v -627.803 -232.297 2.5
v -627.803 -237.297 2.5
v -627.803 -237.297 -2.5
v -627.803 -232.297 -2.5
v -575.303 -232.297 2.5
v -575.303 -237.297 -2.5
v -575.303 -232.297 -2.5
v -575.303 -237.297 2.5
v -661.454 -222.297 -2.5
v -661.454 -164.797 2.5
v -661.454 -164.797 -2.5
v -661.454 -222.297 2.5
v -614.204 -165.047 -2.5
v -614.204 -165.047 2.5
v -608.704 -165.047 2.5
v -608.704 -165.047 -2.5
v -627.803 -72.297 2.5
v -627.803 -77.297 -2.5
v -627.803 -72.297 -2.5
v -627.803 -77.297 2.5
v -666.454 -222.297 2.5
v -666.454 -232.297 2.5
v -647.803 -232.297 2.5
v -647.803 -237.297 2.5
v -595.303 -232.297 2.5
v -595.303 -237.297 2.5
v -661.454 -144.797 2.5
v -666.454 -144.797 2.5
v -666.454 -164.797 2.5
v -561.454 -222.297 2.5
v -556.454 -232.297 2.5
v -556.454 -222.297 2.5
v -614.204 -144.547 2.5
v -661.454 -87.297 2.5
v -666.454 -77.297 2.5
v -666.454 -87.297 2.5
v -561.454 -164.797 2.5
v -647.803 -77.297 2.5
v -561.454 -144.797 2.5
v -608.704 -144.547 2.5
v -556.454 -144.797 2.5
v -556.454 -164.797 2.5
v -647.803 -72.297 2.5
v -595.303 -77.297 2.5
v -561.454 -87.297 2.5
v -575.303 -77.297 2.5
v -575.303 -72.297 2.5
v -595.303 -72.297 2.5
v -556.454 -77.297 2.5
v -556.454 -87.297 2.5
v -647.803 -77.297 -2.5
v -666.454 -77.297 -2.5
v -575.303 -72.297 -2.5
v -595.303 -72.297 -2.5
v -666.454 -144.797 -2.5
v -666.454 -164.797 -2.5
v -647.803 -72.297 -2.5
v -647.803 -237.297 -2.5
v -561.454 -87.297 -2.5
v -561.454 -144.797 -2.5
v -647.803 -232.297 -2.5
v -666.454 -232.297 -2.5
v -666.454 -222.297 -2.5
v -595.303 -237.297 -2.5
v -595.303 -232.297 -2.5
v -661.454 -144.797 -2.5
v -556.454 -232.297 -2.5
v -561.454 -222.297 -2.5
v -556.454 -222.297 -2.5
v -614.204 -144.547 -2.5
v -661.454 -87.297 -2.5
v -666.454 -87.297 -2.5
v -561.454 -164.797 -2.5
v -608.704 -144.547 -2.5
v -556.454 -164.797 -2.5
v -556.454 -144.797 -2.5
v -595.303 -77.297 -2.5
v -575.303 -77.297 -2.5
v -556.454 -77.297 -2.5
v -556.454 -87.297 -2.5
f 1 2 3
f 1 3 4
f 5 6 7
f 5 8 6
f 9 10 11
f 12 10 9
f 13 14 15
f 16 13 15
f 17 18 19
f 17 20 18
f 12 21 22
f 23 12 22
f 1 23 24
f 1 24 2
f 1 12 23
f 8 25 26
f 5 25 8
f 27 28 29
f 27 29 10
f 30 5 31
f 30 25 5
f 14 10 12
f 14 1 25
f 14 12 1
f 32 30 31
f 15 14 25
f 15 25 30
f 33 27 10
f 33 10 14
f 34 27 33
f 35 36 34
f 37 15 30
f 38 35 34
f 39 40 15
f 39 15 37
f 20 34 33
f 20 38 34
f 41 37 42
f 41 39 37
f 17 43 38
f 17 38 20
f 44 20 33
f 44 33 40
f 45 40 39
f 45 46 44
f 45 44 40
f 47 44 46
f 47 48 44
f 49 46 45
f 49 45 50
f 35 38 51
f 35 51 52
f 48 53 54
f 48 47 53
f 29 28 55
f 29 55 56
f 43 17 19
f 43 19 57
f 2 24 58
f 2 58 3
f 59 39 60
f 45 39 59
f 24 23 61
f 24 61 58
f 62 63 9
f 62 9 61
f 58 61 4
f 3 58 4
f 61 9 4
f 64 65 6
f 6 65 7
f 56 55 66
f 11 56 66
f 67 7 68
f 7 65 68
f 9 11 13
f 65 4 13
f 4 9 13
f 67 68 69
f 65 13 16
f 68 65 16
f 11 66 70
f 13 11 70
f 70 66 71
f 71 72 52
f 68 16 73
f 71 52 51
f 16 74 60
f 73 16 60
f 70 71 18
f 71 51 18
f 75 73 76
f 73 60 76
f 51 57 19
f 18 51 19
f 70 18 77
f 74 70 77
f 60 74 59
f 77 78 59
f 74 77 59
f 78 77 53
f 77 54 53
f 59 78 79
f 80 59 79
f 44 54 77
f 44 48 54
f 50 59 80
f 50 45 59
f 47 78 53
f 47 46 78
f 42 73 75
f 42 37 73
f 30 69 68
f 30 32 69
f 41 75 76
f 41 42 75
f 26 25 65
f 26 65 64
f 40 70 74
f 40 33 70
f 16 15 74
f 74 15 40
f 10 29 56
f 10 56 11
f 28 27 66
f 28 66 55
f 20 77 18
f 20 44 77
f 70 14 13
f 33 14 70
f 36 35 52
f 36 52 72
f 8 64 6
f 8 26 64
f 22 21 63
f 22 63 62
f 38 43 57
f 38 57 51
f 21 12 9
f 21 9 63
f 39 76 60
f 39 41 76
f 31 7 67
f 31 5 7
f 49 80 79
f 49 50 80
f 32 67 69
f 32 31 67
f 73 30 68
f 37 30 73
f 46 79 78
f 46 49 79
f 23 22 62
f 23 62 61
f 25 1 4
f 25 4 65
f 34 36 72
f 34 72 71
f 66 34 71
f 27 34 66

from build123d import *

# Parameters (mm, degrees)
SKETCH2_W           = 5.5
SKETCH2_H           = 20.5
BOSS_EXTRUDE1_DEPTH = 2.5


with BuildPart() as part:
    # Sketch2 → Boss-Extrude1 (new, symmetric)
    with BuildSketch(Plane.XY):
        Polygon((-627.802632857, -77.297008648), (-627.802632857, -72.297008648), (-647.802632857, -72.297008648), (-647.802632857, -77.297008648), (-666.454340614, -77.297008648), (-666.454340614, -87.297008648), (-661.454340614, -87.297008648), (-661.454340614, -144.797008648), (-666.454340614, -144.797008648), (-666.454340614, -164.797008648), (-661.454340614, -164.797008648), (-661.454340614, -222.297008648), (-666.454340614, -222.297008648), (-666.454340614, -232.297008648), (-647.802632857, -232.297008648), (-647.802632857, -237.297008648), (-627.802632857, -237.297008648), (-627.802632857, -232.297008648), (-595.302601942, -232.297008648), (-595.302601942, -237.297008648), (-575.302601942, -237.297008648), (-575.302601942, -232.297008648), (-556.454340614, -232.297008648), (-556.454340614, -222.297008648), (-561.454340614, -222.297008648), (-561.454340614, -164.797008648), (-556.454340614, -164.797008648), (-556.454340614, -144.797008648), (-561.454340614, -144.797008648), (-561.454340614, -87.297008648), (-556.454340614, -87.297008648), (-556.454340614, -77.297008648), (-575.302601942, -77.297008648), (-575.302601942, -72.297008648), (-595.302601942, -72.297008648), (-595.302601942, -77.297008648), align=None)
        with Locations((-611.454340614, -154.797008648)):
            Rectangle(SKETCH2_W, SKETCH2_H, mode=Mode.SUBTRACT)
    extrude(amount=BOSS_EXTRUDE1_DEPTH, both=True)


solid = part.part
